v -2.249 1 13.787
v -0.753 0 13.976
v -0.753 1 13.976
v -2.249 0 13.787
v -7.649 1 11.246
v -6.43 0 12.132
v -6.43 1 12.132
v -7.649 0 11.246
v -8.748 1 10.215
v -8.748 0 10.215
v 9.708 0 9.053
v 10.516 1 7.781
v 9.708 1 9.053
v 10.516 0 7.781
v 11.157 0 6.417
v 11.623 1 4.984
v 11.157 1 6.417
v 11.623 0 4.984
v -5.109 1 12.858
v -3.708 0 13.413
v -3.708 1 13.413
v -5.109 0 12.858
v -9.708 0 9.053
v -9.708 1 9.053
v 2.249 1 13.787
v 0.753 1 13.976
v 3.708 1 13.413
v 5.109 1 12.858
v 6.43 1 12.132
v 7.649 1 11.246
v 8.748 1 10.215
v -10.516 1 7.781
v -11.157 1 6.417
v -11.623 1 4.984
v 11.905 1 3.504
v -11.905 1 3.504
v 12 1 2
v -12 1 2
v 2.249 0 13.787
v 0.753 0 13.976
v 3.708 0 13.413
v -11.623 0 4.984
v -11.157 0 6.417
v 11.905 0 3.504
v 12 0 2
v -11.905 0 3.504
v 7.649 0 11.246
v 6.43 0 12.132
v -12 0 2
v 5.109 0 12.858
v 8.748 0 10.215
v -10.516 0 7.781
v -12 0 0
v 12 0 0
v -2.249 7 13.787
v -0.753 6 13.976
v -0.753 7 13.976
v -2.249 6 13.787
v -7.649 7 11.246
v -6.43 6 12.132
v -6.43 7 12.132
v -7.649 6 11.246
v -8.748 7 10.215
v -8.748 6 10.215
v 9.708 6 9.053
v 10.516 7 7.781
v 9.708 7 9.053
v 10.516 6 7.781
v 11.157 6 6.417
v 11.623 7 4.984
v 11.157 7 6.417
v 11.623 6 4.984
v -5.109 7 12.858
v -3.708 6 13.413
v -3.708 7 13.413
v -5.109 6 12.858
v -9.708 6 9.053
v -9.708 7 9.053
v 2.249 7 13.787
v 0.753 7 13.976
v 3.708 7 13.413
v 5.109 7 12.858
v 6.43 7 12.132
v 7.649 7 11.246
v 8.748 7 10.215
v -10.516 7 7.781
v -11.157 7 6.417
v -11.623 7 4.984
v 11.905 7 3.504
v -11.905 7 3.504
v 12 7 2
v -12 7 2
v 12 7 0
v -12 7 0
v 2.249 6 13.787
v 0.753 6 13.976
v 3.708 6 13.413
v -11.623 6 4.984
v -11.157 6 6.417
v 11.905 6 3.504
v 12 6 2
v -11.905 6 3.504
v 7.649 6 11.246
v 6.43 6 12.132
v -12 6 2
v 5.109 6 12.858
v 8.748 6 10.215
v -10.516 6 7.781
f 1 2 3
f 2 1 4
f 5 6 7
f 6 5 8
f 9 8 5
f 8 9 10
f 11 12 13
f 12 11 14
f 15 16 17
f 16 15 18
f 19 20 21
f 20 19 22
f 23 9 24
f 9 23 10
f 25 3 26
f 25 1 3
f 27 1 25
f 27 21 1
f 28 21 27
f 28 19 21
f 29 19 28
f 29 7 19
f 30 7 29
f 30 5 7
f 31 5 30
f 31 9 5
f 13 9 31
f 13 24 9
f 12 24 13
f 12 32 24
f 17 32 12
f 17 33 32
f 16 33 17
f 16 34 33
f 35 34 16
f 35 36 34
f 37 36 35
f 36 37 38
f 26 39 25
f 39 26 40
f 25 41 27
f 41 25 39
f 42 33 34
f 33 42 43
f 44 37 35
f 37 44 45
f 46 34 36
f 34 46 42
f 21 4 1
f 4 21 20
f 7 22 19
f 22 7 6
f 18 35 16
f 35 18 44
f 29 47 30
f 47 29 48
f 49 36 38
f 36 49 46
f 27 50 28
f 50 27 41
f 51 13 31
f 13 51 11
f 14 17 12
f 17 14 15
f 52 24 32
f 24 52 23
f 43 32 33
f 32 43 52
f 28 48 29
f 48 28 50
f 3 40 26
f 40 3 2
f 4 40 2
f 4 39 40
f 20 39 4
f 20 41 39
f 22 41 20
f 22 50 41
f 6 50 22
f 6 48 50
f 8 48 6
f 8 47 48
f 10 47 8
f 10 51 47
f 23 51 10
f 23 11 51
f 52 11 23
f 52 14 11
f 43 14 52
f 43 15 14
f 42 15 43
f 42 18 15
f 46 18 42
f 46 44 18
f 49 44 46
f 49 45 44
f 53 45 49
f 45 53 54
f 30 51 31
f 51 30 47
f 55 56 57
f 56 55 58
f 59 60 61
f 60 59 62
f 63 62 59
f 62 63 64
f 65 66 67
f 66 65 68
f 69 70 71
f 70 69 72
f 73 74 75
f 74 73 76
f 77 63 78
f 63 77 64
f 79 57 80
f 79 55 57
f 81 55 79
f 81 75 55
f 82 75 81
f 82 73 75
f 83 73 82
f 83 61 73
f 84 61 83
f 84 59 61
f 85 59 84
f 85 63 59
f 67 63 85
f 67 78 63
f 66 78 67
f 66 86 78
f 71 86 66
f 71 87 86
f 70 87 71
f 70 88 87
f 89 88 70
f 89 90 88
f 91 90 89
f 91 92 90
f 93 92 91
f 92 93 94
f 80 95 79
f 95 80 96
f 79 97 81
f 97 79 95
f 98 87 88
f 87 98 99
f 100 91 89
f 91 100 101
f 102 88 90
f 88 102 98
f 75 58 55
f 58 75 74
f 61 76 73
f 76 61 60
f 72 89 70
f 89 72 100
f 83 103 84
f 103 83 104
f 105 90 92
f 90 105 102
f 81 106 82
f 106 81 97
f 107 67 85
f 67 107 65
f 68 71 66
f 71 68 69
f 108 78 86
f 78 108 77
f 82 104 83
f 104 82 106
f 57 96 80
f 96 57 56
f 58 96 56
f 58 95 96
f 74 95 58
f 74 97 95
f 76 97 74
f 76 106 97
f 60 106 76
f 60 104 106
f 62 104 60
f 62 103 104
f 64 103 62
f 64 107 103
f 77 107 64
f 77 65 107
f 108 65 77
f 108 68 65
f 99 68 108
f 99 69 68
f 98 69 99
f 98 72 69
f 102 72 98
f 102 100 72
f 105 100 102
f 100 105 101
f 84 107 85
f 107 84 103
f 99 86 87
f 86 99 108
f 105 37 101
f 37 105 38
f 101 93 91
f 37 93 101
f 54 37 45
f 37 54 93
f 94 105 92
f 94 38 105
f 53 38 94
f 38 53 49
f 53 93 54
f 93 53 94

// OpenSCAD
//henry Piller 2017
// variable description
// Ausschnitt
breite = 5; // [5:0.5:30]
//Rundung
durchmesser = 24; // [5:0.2:50]
loch = 0 ; // [0:nein,1:ja]
/*[hidden]*/
radius= durchmesser/2;
$fn = 50;
 rotate([270,0,0])
  translate([0,-2,0])  
difference(){
union(){
difference(){
union(){
 cylinder(h=1,r1=radius,r2=radius,center=false);
  translate([0,0,breite+1])  
 cylinder(h=1,r1=radius,r2=radius,center=false);
}
translate([-radius,0,0])
 cube([durchmesser+1,durchmesser+1,durchmesser+1/2],center=false);
}
translate([-radius,0,0])
 cube([durchmesser,2,breite+2],center=false);
}
if (loch==1){
 translate([0,-radius/2,0])
cylinder(h=2,r1=radius/3,r2=radius/3,center=false);
}
}
//end
